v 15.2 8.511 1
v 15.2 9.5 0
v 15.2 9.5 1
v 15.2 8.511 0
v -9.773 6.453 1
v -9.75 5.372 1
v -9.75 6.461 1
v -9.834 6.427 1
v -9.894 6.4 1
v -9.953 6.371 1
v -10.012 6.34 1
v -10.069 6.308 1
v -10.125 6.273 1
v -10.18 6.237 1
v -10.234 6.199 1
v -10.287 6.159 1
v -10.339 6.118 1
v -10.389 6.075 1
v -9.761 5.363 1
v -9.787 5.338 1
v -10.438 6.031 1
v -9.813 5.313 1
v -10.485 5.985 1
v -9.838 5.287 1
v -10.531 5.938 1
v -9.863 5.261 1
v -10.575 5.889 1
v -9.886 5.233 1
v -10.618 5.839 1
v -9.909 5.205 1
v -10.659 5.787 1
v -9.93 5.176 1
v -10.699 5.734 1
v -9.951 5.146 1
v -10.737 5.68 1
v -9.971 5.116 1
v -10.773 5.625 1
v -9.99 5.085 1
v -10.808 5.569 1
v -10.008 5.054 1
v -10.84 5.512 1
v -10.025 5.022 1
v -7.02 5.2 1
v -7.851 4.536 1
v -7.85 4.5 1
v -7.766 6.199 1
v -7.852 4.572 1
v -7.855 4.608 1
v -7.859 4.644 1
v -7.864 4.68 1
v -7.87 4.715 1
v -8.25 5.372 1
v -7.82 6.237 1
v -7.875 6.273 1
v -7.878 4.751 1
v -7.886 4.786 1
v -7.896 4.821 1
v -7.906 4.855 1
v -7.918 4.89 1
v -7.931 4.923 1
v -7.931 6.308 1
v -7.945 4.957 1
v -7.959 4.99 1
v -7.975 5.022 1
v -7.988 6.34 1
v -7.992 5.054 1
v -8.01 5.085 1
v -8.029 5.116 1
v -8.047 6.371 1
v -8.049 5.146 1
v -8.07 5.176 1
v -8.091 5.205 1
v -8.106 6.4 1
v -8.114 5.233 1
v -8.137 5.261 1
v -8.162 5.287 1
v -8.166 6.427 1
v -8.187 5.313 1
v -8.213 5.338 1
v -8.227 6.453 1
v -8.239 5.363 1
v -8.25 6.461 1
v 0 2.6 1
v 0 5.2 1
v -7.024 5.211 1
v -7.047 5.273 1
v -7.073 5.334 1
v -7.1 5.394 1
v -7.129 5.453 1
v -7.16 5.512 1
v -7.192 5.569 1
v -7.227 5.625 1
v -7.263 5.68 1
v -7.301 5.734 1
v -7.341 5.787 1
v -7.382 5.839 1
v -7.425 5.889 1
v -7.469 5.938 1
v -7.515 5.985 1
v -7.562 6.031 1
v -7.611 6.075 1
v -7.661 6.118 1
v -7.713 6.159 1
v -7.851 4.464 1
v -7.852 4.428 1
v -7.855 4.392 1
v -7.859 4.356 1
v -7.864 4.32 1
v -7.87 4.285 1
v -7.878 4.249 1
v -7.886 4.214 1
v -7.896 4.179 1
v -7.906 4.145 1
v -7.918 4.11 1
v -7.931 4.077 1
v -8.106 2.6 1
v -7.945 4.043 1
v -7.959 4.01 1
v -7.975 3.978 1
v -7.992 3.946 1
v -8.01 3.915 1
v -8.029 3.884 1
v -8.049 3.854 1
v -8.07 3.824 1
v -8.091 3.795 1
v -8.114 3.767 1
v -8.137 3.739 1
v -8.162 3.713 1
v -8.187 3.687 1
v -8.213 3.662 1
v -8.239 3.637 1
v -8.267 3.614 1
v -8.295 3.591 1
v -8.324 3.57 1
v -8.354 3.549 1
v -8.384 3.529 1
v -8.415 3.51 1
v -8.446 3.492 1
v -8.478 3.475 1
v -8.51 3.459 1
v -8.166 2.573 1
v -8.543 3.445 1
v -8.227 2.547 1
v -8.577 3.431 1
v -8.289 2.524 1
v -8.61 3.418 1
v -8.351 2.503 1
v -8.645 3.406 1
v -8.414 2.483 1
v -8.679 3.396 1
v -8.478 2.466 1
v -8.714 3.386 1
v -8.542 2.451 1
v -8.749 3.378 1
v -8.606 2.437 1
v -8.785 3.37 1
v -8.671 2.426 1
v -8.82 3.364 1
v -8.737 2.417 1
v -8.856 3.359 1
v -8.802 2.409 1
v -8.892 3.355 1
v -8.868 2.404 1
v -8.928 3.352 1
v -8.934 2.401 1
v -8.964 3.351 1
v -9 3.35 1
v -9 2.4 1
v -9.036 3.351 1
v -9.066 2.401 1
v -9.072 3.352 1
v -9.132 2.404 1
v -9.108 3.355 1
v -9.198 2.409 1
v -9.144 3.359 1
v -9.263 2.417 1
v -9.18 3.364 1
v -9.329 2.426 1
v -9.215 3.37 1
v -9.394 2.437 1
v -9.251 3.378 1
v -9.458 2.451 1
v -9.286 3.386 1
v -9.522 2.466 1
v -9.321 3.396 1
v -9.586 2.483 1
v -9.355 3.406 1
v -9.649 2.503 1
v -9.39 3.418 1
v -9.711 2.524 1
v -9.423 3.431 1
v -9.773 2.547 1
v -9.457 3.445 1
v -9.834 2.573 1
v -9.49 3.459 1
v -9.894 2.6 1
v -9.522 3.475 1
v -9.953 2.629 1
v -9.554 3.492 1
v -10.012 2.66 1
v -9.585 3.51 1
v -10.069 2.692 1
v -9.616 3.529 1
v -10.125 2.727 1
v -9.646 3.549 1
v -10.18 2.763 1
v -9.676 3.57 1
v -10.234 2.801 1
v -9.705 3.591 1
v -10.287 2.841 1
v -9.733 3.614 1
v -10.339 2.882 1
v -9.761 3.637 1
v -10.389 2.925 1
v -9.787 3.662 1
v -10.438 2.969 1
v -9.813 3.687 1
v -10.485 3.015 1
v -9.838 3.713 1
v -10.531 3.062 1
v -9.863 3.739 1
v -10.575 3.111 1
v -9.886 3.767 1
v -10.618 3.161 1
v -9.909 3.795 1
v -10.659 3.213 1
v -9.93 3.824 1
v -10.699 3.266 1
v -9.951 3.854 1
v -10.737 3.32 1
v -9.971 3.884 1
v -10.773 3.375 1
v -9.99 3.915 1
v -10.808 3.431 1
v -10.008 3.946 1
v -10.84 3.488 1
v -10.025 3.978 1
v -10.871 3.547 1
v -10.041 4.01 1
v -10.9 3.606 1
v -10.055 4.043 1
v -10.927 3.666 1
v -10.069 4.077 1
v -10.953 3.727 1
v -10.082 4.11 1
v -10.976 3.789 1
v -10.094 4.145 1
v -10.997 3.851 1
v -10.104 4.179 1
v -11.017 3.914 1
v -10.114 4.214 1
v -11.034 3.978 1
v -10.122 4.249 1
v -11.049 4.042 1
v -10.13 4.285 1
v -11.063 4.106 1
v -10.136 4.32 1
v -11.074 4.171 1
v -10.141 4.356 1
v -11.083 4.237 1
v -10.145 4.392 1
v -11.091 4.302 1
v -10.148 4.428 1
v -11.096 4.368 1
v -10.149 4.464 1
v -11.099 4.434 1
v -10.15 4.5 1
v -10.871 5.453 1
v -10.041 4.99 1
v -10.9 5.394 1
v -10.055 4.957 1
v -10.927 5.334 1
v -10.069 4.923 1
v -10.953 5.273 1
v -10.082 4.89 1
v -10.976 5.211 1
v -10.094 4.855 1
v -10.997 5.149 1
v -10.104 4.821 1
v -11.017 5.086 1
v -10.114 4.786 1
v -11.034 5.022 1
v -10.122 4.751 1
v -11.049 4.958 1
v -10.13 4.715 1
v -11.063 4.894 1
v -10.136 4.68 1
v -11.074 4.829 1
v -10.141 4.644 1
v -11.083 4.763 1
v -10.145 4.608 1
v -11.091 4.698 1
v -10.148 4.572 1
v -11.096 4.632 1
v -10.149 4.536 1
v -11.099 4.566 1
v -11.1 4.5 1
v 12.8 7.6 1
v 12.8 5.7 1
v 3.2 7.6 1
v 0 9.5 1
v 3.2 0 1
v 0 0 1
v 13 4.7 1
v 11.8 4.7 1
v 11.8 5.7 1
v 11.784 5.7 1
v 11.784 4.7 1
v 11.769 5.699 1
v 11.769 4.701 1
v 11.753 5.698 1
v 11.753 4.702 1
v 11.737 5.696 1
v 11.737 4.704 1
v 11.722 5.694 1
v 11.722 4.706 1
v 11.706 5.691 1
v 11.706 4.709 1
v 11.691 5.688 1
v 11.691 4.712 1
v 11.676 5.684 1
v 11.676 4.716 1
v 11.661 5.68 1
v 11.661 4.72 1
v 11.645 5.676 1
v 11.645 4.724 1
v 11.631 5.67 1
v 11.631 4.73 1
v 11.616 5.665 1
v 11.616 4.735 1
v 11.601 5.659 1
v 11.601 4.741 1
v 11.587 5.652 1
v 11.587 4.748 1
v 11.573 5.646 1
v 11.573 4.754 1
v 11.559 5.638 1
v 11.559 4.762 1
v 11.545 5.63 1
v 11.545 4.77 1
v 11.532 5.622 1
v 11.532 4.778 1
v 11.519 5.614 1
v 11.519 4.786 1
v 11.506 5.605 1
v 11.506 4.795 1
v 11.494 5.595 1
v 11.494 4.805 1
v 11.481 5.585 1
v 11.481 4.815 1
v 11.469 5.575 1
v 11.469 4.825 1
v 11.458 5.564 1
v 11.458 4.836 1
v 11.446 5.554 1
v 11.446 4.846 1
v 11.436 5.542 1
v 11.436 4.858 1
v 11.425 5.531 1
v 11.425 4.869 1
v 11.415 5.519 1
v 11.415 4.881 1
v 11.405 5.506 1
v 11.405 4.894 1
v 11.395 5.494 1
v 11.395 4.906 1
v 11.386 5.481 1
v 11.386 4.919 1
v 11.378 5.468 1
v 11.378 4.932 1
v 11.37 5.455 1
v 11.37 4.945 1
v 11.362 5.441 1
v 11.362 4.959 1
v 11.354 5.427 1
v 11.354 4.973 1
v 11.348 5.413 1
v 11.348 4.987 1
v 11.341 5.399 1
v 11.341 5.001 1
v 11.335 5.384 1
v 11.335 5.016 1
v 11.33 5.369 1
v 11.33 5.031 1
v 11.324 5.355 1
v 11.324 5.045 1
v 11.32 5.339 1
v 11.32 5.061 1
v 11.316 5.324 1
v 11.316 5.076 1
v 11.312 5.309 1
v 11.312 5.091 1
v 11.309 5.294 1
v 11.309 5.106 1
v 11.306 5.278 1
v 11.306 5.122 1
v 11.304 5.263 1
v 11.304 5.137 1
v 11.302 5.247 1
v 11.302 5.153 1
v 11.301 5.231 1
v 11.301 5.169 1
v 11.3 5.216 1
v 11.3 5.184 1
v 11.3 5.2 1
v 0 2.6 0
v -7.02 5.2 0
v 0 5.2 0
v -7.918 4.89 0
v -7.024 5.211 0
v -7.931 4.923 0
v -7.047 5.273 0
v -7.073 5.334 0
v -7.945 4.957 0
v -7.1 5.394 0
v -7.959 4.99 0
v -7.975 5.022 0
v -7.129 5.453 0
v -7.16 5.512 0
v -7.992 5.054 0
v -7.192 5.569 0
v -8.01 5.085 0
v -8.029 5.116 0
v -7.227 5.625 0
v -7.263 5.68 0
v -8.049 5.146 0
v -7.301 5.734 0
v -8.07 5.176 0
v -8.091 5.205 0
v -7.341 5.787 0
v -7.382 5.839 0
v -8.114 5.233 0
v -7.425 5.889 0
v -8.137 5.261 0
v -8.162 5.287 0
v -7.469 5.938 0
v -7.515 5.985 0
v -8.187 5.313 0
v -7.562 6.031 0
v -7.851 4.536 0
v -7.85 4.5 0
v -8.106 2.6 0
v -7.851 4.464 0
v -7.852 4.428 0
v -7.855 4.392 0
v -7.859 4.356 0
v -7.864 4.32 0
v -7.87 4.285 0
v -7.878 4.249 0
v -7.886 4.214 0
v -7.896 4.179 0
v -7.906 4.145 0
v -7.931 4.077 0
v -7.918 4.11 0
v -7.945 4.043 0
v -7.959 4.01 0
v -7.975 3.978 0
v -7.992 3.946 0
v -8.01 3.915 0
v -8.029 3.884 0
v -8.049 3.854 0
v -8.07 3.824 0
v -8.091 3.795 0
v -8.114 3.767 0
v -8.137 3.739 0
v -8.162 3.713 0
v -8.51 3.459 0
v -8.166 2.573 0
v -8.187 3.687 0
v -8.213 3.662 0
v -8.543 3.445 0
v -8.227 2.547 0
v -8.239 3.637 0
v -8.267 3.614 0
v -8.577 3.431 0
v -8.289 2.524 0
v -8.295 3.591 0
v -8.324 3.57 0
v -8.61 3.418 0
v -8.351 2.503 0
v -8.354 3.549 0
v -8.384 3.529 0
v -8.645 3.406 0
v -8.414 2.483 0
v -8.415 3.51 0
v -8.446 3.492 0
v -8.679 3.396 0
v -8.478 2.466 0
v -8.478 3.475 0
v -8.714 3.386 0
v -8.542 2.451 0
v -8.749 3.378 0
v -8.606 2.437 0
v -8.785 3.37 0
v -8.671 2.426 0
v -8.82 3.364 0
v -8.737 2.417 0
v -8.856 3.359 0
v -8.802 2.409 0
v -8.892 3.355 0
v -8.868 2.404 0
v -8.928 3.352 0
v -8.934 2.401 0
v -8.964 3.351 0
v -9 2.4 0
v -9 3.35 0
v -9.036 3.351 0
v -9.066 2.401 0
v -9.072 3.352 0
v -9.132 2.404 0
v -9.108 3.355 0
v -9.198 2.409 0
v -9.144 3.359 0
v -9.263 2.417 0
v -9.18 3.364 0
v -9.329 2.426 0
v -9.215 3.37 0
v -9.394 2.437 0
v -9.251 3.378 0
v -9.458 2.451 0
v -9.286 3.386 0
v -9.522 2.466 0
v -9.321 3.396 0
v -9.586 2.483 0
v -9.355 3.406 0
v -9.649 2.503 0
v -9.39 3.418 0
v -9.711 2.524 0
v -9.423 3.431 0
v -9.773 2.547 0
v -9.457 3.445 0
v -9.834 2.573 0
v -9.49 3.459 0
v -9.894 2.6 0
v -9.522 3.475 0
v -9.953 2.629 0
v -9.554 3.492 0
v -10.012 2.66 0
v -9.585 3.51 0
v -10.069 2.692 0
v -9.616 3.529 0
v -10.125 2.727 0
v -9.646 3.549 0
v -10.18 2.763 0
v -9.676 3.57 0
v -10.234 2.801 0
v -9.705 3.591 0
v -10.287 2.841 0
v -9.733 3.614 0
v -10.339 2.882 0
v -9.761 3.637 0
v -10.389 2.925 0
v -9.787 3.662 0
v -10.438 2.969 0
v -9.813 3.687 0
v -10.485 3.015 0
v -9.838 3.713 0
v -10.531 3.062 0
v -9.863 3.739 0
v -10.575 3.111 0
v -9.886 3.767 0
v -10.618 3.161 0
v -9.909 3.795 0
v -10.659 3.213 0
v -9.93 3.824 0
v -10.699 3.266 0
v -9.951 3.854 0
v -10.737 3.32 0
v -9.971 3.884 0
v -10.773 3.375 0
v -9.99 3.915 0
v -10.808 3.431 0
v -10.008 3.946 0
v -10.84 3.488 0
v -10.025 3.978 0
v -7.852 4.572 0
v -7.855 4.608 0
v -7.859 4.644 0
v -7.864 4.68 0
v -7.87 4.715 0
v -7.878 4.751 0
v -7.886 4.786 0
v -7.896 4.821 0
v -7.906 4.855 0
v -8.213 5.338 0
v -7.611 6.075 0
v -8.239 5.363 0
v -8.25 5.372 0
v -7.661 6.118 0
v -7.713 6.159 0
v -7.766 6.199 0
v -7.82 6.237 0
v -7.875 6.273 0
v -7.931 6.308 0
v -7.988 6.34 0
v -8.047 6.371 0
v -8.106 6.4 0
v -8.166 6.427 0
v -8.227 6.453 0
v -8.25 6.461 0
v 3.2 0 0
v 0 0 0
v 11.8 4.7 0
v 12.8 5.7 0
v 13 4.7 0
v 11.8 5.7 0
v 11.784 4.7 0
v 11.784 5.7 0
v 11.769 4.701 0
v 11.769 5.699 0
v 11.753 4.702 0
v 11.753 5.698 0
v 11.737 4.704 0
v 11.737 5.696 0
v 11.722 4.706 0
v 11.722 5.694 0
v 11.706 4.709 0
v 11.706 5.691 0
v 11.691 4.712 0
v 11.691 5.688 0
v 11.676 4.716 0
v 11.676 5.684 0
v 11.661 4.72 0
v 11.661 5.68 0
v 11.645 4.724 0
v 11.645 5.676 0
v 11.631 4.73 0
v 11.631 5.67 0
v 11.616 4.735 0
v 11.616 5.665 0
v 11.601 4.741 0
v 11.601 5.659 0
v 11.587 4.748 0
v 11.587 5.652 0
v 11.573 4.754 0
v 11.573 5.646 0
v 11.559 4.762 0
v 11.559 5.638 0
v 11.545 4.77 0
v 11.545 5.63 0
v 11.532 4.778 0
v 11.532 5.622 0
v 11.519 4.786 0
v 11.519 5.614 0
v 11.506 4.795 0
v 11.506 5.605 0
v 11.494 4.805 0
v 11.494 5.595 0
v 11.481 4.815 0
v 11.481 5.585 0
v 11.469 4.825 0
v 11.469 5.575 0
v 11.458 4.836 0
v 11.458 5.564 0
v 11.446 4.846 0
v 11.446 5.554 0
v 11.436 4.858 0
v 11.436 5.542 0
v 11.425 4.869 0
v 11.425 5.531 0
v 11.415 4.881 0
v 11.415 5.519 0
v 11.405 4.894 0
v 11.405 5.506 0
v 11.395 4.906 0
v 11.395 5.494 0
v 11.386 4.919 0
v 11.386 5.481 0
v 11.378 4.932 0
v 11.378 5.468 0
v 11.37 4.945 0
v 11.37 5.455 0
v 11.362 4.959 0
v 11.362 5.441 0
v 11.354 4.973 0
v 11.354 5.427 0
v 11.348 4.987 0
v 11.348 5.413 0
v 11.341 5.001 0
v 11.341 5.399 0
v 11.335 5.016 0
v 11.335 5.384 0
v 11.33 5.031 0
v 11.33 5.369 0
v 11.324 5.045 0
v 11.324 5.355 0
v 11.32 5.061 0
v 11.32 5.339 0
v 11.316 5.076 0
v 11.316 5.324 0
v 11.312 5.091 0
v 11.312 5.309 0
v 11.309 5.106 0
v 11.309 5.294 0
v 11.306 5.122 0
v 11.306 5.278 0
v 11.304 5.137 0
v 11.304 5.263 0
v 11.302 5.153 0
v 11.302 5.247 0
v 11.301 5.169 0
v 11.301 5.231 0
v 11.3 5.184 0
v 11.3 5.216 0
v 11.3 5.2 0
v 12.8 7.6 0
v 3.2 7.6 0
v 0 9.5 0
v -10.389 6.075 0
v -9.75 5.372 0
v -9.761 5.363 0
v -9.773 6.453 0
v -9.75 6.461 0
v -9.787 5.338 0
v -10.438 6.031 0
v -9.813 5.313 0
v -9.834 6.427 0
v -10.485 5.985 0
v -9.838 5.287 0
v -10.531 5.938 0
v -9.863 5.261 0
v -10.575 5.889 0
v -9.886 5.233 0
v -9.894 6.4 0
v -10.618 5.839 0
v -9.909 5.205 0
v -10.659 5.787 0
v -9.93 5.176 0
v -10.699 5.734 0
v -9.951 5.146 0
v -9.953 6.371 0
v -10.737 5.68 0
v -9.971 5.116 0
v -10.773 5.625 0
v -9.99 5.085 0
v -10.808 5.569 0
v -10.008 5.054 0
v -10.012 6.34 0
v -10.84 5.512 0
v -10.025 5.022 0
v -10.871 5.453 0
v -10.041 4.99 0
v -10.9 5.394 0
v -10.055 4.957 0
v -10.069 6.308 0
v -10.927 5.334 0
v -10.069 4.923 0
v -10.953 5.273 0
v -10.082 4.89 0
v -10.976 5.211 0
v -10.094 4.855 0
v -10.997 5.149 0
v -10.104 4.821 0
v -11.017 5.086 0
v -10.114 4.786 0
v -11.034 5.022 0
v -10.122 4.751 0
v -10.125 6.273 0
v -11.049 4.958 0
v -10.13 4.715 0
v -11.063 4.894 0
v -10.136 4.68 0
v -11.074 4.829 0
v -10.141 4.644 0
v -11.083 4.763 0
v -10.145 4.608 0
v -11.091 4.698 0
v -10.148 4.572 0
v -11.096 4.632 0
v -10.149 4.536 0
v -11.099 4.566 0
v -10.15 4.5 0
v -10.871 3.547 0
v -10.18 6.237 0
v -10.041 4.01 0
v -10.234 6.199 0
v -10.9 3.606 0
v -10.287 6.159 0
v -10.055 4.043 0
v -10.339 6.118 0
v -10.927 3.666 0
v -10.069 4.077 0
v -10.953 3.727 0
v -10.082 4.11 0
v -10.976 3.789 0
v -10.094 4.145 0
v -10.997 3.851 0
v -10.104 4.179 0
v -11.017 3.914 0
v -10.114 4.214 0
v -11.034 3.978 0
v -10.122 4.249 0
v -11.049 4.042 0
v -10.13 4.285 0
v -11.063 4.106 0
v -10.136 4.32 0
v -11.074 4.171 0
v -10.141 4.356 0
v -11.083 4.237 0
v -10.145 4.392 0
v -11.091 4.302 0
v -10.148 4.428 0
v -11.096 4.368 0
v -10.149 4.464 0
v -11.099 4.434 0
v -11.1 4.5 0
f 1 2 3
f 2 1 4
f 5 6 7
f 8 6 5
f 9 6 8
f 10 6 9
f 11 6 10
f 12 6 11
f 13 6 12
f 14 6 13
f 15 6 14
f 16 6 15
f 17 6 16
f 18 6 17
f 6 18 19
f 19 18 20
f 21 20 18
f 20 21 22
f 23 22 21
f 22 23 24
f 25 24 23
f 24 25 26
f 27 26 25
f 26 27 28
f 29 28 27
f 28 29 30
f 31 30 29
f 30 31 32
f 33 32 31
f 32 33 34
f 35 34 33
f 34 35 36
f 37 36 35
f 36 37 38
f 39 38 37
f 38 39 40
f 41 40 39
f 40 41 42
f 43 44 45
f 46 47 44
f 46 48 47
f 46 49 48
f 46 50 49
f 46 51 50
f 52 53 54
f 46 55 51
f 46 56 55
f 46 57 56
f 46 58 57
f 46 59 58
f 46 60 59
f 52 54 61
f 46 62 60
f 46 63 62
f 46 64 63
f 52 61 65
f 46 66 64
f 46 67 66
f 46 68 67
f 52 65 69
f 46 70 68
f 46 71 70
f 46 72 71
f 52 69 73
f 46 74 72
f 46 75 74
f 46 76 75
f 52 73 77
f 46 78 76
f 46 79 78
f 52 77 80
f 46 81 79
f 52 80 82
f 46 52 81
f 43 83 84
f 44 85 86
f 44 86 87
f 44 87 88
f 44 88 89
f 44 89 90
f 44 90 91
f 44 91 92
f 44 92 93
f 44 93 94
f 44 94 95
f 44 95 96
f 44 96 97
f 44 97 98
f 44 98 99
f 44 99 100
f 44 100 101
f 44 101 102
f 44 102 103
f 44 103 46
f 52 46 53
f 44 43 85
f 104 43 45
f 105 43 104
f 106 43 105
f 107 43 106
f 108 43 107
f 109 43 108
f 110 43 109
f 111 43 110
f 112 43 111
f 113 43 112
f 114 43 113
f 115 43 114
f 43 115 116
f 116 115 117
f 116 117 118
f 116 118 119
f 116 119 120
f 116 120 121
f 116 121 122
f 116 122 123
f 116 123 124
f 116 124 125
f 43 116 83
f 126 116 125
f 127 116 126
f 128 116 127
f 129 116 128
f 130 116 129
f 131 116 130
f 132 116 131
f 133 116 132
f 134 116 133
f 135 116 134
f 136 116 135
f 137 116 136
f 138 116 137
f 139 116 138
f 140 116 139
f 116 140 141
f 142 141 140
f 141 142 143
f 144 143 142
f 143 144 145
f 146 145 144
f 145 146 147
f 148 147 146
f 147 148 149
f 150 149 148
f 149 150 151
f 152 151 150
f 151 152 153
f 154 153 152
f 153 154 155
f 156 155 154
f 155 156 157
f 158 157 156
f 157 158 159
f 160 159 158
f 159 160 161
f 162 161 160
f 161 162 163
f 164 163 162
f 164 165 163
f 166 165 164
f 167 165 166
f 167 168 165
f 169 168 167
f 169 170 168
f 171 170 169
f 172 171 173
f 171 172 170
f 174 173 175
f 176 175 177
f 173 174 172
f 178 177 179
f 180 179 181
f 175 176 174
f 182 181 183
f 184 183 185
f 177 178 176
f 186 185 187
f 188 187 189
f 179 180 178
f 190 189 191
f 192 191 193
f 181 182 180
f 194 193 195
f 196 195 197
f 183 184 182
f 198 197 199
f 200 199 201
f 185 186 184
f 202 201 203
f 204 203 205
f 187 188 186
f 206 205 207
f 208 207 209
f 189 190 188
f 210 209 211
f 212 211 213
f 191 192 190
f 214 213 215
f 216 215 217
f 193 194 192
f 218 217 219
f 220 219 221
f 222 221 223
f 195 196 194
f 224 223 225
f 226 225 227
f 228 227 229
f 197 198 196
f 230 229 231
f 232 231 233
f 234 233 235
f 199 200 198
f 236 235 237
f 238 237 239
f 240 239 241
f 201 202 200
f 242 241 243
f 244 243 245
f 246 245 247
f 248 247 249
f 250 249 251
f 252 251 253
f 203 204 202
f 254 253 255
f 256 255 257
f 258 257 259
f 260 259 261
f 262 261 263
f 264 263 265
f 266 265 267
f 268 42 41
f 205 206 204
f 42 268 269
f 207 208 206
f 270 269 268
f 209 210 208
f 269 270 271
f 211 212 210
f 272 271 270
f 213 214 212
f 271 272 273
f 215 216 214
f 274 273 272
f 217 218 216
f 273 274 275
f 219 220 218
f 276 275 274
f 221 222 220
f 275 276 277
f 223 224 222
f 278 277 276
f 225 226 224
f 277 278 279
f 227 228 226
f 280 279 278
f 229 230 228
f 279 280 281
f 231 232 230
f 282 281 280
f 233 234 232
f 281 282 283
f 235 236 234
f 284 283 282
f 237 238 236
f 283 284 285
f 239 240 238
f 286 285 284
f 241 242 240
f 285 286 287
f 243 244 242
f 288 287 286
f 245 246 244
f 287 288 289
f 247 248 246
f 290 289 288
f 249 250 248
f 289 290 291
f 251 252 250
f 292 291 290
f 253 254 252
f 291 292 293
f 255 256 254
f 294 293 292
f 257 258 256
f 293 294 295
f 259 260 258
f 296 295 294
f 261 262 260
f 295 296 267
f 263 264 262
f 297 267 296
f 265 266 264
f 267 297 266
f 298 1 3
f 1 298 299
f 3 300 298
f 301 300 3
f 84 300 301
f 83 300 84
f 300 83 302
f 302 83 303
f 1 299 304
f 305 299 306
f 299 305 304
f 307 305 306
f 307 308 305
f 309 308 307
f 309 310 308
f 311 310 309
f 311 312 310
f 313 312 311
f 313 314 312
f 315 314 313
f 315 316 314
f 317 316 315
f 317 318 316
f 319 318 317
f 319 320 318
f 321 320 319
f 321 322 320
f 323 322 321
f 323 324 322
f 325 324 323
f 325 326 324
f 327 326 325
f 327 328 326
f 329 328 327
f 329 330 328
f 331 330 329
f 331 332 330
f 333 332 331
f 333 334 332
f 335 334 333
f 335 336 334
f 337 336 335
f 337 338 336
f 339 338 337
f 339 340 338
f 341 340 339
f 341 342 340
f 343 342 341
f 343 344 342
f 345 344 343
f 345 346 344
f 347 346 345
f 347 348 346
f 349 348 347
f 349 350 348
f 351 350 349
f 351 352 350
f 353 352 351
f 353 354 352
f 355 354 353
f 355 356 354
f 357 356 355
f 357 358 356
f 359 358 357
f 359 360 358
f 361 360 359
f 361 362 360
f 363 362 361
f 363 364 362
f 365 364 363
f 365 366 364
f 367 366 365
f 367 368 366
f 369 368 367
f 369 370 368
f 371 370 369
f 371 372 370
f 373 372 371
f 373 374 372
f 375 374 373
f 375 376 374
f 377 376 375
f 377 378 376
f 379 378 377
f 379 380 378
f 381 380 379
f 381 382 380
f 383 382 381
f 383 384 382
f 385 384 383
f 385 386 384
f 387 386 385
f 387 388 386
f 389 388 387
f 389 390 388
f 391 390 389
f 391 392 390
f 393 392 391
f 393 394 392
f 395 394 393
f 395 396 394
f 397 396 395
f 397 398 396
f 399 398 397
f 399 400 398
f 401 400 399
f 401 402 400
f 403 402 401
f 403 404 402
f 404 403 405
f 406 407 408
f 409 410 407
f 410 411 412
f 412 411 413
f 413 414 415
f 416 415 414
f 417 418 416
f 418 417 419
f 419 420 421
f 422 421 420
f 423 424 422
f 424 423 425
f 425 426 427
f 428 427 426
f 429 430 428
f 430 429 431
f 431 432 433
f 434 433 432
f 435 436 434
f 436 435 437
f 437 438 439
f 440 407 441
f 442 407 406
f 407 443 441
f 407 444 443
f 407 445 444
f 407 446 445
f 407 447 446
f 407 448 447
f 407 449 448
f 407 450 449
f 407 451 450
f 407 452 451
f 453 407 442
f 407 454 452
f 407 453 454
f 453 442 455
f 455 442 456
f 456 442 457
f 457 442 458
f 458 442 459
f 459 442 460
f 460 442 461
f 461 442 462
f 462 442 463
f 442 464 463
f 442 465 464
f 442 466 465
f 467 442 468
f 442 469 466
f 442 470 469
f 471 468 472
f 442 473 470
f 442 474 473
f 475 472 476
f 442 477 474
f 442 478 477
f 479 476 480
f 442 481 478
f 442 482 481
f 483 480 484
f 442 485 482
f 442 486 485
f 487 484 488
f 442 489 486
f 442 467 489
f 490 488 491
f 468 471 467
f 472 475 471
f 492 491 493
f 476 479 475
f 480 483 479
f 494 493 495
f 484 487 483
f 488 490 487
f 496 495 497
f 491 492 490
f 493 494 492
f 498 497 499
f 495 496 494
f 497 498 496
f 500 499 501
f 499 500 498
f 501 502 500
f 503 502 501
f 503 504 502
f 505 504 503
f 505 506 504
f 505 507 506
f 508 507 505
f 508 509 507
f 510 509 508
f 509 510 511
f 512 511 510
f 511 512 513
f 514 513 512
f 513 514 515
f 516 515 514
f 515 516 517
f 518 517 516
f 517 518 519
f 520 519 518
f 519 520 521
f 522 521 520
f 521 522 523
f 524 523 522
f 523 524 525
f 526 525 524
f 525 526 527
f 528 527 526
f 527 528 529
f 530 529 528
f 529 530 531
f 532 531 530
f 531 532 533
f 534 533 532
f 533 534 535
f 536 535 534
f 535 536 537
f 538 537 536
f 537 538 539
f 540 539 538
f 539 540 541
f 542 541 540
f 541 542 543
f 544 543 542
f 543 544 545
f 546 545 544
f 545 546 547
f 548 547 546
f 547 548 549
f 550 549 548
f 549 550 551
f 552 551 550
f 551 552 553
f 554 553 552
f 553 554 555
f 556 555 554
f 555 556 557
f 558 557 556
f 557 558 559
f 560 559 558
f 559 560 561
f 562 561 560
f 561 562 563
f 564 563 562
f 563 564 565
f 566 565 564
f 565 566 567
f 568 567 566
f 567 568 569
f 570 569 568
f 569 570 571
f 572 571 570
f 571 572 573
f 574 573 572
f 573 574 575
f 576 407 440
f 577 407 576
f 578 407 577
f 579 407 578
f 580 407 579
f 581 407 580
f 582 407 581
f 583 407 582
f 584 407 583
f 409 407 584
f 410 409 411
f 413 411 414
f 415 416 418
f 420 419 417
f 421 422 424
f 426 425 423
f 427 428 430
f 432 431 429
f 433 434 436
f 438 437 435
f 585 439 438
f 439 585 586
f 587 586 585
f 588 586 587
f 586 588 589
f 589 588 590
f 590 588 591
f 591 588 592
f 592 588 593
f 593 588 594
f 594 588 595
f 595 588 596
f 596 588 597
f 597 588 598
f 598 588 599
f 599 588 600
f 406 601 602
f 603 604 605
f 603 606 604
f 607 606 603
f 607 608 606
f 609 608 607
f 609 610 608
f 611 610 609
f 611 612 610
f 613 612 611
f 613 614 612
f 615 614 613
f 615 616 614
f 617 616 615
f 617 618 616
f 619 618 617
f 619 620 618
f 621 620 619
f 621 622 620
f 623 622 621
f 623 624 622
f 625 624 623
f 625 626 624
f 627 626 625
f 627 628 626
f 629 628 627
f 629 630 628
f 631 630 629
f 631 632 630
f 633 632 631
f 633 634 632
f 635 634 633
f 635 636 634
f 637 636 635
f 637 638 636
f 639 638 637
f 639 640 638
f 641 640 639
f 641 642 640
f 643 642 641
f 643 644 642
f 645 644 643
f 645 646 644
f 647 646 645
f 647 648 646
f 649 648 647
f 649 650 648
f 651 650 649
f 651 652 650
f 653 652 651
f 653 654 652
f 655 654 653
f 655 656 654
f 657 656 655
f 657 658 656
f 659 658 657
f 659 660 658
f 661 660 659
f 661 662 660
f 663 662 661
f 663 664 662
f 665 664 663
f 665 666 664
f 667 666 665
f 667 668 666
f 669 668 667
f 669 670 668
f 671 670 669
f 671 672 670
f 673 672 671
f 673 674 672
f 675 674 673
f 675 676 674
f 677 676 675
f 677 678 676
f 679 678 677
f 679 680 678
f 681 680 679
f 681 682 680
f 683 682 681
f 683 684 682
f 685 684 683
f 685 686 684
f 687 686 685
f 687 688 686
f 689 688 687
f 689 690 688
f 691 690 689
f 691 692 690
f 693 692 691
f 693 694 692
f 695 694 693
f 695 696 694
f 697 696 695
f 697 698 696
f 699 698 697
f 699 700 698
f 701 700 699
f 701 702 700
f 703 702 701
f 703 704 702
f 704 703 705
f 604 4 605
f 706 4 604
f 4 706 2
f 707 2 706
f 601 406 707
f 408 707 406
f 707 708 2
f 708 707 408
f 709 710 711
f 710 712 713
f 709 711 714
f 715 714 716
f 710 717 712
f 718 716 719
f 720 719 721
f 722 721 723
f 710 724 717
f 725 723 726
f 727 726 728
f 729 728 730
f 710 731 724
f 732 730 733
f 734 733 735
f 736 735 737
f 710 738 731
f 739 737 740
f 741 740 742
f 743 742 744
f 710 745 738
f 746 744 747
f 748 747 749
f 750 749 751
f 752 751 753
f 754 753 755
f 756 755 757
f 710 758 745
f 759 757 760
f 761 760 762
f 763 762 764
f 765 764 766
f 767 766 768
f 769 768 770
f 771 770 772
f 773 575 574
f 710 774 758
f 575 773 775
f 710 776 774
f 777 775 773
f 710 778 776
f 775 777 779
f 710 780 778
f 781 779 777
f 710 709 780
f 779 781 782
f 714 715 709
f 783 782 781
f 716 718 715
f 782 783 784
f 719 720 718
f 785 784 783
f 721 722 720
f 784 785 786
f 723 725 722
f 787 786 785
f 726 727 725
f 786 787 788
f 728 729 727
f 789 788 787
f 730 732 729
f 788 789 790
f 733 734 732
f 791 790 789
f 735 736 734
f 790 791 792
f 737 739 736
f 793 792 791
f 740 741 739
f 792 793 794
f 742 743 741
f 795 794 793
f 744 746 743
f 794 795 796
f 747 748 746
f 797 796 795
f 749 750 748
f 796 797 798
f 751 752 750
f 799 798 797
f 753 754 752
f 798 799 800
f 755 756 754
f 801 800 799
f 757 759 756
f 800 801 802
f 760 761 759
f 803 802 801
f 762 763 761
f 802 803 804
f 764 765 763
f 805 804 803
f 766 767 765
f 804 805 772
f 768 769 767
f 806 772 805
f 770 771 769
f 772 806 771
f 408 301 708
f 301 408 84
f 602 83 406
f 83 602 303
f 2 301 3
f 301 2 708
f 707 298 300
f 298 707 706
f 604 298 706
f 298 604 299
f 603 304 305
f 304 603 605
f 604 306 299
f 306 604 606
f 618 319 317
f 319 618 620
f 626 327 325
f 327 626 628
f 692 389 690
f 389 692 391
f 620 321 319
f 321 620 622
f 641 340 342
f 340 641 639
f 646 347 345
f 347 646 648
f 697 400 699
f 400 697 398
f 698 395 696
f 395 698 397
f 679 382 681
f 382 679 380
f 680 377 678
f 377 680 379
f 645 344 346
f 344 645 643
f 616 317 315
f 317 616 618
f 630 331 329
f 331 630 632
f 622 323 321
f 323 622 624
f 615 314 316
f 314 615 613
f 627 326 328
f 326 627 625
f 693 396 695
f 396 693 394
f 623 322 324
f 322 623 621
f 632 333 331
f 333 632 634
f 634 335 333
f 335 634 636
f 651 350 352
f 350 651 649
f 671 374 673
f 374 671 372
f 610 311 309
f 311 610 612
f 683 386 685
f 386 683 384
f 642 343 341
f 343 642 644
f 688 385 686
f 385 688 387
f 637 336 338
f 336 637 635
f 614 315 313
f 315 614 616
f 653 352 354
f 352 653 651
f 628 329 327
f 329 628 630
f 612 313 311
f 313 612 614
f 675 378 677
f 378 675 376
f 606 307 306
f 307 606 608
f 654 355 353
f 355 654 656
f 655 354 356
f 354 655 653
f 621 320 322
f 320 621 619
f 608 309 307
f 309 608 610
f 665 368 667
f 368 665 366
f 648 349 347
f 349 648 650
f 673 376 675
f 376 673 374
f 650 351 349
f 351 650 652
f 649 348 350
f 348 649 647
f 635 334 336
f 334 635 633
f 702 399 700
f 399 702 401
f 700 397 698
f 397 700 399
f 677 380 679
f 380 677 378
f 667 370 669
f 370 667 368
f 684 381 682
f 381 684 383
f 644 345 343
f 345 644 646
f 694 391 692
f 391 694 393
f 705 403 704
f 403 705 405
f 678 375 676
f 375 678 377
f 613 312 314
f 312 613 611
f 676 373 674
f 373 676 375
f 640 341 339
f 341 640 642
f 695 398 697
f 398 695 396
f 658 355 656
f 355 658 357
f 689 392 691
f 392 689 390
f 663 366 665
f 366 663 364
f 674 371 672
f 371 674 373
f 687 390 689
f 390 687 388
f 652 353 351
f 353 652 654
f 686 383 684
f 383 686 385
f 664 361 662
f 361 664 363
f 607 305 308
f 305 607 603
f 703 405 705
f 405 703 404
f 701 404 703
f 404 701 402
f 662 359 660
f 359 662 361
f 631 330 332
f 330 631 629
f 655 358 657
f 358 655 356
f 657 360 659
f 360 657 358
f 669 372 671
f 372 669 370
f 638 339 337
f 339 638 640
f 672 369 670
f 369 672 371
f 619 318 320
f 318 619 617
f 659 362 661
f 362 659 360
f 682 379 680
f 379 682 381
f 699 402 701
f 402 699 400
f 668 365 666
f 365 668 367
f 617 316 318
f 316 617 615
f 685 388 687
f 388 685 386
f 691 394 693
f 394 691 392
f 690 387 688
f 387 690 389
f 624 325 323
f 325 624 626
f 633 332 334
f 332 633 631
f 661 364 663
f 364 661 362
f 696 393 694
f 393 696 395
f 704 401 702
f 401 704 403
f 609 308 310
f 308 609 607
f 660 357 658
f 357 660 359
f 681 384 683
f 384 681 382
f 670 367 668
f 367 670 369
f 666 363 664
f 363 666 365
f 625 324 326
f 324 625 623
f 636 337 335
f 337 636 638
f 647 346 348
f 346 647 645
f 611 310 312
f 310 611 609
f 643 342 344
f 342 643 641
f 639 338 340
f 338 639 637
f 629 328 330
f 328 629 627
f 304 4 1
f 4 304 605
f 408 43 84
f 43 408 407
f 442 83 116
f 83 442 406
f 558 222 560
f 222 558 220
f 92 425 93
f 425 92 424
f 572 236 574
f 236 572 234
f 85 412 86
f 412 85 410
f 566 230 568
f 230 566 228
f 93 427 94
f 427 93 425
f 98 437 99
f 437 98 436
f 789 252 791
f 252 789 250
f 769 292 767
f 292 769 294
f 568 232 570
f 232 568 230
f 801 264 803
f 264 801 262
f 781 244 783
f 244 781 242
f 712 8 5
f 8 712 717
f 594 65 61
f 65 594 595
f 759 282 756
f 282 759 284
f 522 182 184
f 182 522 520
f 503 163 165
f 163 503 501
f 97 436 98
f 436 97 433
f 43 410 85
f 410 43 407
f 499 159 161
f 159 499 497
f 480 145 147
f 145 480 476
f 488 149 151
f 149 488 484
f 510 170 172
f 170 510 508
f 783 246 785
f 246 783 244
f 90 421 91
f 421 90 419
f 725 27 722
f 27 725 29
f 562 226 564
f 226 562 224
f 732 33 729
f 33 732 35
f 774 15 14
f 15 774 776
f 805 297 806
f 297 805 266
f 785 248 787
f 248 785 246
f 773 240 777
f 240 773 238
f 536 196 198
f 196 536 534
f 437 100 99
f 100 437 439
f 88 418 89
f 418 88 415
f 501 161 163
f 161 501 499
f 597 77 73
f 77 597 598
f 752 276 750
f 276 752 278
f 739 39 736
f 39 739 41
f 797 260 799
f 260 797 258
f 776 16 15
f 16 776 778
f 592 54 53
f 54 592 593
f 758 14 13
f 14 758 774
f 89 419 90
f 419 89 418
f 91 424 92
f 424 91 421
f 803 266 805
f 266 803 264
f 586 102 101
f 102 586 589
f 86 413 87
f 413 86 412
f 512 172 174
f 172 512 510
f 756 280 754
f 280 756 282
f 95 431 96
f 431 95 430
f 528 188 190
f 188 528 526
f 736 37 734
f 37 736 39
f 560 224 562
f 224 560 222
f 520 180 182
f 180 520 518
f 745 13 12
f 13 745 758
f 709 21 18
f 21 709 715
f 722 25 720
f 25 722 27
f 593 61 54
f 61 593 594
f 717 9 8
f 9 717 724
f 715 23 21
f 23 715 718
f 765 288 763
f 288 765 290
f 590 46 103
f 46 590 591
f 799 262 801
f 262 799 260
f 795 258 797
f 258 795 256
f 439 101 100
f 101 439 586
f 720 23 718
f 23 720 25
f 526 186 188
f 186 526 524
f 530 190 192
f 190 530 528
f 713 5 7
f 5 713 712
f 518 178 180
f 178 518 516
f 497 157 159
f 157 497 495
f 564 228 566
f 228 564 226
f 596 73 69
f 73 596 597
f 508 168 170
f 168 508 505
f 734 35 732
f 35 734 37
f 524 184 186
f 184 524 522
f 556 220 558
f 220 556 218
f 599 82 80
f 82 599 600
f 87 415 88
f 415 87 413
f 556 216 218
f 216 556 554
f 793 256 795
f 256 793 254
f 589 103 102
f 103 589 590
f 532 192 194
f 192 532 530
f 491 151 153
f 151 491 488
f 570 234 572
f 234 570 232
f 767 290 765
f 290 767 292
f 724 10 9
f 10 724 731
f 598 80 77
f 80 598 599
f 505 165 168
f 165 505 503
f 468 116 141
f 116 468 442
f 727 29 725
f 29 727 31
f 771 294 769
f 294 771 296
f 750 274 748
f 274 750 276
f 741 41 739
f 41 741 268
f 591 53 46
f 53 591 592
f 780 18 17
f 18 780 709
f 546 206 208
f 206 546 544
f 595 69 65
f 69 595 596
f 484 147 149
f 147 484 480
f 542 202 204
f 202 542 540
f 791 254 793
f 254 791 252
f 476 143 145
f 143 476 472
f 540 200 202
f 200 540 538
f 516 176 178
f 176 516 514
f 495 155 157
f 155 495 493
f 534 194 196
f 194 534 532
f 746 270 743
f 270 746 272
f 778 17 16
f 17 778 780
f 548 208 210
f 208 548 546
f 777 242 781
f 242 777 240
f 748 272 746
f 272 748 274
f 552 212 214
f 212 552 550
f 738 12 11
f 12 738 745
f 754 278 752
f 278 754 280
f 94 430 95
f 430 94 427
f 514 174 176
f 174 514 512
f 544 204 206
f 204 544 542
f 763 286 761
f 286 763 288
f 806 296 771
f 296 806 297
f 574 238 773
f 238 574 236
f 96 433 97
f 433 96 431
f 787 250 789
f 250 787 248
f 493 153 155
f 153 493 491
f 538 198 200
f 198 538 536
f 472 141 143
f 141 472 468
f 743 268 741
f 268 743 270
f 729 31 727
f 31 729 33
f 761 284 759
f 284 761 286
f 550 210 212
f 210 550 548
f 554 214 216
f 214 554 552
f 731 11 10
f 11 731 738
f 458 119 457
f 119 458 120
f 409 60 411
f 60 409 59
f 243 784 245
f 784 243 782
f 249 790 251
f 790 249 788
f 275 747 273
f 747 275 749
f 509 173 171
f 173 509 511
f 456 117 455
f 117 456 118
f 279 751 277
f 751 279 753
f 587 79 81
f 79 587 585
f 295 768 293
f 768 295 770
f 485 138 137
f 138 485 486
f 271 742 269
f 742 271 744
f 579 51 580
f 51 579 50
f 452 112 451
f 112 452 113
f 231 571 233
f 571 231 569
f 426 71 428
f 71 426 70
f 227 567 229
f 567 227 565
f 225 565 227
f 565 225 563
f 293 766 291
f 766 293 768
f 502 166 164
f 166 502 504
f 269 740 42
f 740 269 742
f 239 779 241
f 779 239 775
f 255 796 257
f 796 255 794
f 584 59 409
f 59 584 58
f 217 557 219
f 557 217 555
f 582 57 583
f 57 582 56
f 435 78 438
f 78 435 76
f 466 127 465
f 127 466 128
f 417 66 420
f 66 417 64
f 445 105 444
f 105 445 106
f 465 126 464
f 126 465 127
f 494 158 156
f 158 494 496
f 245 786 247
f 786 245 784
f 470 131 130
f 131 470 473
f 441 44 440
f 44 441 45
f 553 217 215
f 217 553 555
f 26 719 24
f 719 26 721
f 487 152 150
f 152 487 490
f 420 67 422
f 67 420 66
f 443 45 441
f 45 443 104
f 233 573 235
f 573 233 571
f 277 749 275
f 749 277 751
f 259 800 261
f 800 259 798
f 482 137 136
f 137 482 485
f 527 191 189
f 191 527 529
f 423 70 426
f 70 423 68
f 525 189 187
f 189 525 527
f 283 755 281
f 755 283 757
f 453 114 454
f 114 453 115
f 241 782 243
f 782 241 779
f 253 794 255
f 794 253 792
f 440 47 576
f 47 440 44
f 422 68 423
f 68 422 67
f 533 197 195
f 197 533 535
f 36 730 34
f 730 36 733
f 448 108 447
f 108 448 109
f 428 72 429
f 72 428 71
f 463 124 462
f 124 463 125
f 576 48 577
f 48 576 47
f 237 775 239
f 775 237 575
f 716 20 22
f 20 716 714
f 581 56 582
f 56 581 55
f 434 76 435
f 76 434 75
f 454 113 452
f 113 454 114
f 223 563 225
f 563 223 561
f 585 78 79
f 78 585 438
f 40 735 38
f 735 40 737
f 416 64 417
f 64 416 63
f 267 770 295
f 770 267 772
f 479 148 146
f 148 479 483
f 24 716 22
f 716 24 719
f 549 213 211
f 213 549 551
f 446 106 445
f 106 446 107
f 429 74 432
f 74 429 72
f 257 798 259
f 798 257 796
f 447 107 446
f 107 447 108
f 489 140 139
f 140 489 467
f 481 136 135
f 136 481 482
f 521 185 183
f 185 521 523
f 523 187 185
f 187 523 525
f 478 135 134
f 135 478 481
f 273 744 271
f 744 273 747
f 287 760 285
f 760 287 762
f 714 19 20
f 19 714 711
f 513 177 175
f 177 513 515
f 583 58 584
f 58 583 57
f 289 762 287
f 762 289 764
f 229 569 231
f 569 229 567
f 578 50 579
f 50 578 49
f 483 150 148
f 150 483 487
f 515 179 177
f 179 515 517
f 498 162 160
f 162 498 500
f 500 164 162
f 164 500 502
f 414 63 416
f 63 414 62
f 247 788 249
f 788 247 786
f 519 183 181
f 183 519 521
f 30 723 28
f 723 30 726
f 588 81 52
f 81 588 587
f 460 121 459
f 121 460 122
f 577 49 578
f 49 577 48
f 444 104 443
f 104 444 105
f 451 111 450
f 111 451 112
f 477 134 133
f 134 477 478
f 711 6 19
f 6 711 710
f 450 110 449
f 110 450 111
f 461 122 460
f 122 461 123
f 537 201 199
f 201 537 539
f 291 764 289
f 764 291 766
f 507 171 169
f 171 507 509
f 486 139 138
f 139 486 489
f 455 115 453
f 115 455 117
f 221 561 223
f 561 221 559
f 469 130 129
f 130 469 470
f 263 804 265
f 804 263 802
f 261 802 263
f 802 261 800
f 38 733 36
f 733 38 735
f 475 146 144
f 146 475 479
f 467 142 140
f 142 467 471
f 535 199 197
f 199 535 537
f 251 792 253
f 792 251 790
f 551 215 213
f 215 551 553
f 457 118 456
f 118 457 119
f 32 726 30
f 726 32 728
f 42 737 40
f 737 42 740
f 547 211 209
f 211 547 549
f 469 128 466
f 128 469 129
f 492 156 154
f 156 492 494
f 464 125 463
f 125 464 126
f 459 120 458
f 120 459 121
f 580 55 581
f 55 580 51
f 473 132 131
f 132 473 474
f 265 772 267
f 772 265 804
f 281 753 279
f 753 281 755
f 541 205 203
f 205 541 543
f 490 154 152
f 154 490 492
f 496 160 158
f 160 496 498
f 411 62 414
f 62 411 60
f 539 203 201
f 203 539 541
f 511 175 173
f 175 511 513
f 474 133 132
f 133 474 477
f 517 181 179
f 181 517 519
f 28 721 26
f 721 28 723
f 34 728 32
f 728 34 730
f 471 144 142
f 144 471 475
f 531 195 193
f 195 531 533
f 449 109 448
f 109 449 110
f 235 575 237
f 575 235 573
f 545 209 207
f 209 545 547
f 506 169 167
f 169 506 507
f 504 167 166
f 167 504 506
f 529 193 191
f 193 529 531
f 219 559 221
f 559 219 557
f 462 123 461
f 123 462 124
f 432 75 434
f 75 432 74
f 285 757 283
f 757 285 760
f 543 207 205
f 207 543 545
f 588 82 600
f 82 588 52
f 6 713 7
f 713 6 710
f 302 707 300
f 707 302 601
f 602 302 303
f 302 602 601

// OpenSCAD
//z
thickness = 1;

midbar_width = 3.2;
midbar_height = 9.5;

topbar_width = 15.2;
topbar_height = 1.9;

//from coupling
main_arm_width = 6;

hinge_base_diameter=4.2;
hinge_diameter = 2.3;
hinge_gap = 1.5;
hinge_bar_height = 2.6;
hinge_bar_width=8+1;
hinge_bar_y = 2.6;
hinge_x = 9;
hinge_y = 4.5;
hinge_depth = main_arm_width + 4;

flange_extra = 0.5;
flange_depth = 3;
flange_slit = 0.5;
flange_slit_depth_multiplier = 0.7;

hook_total_height = 4.8;
//hook_inner_height = 1.55;
hook_overhang = 1.3;
hook_inner_x = 9.6 + midbar_width;
hook_d = hook_total_height - topbar_height - topbar_height;

anti_wobble_height = 3;

//mid bar
cube([midbar_width, midbar_height, thickness]);

difference(){
    union(){

    //top bar
    translate([0,midbar_height-topbar_height,0]){
        cube([topbar_width, topbar_height, thickness]);
    }

//hook
        translate([hook_inner_x,midbar_height - hook_total_height, 0]){
            cube([topbar_width - hook_inner_x, hook_total_height,thickness]);
        }
        
        translate([hook_inner_x - hook_d,midbar_height - hook_total_height, 0]){
            cube([hook_d, hook_d, thickness]);
        }
        translate([hook_inner_x - hook_d,midbar_height - hook_total_height+hook_d/2, 0]){
            cylinder(h=thickness, r=hook_d/2, $fn=200);
        }
        
    }
    //lop off an angle
    translate([hook_inner_x+hook_d*0.2 ,midbar_height - hook_total_height,-thickness/2]){
rotate([0,0,-30]){
    cube([5,10,thickness*2]);
}
}
}





difference(){
    union(){
        //hinge bar
        translate([-hinge_bar_width,hinge_bar_y,0]){
            cube([hinge_bar_width, hinge_bar_height, thickness]);
        }
        translate([-hinge_x, hinge_y,0]){
            cylinder(h=thickness,r=hinge_base_diameter/2, $fn=200);
        }
        

    }
    union(){
    //hole in the middle        
    translate([-hinge_x, hinge_y,-0.5]){
       cylinder(h=thickness*100,r=hinge_diameter/2, $fn=200);
    }
    //cut out slot at the top
    translate([-hinge_x, hinge_y+hinge_base_diameter/2,-0.5]){
        cube([hinge_gap,hinge_base_diameter,thickness*10],center = true);
    }
}

}
